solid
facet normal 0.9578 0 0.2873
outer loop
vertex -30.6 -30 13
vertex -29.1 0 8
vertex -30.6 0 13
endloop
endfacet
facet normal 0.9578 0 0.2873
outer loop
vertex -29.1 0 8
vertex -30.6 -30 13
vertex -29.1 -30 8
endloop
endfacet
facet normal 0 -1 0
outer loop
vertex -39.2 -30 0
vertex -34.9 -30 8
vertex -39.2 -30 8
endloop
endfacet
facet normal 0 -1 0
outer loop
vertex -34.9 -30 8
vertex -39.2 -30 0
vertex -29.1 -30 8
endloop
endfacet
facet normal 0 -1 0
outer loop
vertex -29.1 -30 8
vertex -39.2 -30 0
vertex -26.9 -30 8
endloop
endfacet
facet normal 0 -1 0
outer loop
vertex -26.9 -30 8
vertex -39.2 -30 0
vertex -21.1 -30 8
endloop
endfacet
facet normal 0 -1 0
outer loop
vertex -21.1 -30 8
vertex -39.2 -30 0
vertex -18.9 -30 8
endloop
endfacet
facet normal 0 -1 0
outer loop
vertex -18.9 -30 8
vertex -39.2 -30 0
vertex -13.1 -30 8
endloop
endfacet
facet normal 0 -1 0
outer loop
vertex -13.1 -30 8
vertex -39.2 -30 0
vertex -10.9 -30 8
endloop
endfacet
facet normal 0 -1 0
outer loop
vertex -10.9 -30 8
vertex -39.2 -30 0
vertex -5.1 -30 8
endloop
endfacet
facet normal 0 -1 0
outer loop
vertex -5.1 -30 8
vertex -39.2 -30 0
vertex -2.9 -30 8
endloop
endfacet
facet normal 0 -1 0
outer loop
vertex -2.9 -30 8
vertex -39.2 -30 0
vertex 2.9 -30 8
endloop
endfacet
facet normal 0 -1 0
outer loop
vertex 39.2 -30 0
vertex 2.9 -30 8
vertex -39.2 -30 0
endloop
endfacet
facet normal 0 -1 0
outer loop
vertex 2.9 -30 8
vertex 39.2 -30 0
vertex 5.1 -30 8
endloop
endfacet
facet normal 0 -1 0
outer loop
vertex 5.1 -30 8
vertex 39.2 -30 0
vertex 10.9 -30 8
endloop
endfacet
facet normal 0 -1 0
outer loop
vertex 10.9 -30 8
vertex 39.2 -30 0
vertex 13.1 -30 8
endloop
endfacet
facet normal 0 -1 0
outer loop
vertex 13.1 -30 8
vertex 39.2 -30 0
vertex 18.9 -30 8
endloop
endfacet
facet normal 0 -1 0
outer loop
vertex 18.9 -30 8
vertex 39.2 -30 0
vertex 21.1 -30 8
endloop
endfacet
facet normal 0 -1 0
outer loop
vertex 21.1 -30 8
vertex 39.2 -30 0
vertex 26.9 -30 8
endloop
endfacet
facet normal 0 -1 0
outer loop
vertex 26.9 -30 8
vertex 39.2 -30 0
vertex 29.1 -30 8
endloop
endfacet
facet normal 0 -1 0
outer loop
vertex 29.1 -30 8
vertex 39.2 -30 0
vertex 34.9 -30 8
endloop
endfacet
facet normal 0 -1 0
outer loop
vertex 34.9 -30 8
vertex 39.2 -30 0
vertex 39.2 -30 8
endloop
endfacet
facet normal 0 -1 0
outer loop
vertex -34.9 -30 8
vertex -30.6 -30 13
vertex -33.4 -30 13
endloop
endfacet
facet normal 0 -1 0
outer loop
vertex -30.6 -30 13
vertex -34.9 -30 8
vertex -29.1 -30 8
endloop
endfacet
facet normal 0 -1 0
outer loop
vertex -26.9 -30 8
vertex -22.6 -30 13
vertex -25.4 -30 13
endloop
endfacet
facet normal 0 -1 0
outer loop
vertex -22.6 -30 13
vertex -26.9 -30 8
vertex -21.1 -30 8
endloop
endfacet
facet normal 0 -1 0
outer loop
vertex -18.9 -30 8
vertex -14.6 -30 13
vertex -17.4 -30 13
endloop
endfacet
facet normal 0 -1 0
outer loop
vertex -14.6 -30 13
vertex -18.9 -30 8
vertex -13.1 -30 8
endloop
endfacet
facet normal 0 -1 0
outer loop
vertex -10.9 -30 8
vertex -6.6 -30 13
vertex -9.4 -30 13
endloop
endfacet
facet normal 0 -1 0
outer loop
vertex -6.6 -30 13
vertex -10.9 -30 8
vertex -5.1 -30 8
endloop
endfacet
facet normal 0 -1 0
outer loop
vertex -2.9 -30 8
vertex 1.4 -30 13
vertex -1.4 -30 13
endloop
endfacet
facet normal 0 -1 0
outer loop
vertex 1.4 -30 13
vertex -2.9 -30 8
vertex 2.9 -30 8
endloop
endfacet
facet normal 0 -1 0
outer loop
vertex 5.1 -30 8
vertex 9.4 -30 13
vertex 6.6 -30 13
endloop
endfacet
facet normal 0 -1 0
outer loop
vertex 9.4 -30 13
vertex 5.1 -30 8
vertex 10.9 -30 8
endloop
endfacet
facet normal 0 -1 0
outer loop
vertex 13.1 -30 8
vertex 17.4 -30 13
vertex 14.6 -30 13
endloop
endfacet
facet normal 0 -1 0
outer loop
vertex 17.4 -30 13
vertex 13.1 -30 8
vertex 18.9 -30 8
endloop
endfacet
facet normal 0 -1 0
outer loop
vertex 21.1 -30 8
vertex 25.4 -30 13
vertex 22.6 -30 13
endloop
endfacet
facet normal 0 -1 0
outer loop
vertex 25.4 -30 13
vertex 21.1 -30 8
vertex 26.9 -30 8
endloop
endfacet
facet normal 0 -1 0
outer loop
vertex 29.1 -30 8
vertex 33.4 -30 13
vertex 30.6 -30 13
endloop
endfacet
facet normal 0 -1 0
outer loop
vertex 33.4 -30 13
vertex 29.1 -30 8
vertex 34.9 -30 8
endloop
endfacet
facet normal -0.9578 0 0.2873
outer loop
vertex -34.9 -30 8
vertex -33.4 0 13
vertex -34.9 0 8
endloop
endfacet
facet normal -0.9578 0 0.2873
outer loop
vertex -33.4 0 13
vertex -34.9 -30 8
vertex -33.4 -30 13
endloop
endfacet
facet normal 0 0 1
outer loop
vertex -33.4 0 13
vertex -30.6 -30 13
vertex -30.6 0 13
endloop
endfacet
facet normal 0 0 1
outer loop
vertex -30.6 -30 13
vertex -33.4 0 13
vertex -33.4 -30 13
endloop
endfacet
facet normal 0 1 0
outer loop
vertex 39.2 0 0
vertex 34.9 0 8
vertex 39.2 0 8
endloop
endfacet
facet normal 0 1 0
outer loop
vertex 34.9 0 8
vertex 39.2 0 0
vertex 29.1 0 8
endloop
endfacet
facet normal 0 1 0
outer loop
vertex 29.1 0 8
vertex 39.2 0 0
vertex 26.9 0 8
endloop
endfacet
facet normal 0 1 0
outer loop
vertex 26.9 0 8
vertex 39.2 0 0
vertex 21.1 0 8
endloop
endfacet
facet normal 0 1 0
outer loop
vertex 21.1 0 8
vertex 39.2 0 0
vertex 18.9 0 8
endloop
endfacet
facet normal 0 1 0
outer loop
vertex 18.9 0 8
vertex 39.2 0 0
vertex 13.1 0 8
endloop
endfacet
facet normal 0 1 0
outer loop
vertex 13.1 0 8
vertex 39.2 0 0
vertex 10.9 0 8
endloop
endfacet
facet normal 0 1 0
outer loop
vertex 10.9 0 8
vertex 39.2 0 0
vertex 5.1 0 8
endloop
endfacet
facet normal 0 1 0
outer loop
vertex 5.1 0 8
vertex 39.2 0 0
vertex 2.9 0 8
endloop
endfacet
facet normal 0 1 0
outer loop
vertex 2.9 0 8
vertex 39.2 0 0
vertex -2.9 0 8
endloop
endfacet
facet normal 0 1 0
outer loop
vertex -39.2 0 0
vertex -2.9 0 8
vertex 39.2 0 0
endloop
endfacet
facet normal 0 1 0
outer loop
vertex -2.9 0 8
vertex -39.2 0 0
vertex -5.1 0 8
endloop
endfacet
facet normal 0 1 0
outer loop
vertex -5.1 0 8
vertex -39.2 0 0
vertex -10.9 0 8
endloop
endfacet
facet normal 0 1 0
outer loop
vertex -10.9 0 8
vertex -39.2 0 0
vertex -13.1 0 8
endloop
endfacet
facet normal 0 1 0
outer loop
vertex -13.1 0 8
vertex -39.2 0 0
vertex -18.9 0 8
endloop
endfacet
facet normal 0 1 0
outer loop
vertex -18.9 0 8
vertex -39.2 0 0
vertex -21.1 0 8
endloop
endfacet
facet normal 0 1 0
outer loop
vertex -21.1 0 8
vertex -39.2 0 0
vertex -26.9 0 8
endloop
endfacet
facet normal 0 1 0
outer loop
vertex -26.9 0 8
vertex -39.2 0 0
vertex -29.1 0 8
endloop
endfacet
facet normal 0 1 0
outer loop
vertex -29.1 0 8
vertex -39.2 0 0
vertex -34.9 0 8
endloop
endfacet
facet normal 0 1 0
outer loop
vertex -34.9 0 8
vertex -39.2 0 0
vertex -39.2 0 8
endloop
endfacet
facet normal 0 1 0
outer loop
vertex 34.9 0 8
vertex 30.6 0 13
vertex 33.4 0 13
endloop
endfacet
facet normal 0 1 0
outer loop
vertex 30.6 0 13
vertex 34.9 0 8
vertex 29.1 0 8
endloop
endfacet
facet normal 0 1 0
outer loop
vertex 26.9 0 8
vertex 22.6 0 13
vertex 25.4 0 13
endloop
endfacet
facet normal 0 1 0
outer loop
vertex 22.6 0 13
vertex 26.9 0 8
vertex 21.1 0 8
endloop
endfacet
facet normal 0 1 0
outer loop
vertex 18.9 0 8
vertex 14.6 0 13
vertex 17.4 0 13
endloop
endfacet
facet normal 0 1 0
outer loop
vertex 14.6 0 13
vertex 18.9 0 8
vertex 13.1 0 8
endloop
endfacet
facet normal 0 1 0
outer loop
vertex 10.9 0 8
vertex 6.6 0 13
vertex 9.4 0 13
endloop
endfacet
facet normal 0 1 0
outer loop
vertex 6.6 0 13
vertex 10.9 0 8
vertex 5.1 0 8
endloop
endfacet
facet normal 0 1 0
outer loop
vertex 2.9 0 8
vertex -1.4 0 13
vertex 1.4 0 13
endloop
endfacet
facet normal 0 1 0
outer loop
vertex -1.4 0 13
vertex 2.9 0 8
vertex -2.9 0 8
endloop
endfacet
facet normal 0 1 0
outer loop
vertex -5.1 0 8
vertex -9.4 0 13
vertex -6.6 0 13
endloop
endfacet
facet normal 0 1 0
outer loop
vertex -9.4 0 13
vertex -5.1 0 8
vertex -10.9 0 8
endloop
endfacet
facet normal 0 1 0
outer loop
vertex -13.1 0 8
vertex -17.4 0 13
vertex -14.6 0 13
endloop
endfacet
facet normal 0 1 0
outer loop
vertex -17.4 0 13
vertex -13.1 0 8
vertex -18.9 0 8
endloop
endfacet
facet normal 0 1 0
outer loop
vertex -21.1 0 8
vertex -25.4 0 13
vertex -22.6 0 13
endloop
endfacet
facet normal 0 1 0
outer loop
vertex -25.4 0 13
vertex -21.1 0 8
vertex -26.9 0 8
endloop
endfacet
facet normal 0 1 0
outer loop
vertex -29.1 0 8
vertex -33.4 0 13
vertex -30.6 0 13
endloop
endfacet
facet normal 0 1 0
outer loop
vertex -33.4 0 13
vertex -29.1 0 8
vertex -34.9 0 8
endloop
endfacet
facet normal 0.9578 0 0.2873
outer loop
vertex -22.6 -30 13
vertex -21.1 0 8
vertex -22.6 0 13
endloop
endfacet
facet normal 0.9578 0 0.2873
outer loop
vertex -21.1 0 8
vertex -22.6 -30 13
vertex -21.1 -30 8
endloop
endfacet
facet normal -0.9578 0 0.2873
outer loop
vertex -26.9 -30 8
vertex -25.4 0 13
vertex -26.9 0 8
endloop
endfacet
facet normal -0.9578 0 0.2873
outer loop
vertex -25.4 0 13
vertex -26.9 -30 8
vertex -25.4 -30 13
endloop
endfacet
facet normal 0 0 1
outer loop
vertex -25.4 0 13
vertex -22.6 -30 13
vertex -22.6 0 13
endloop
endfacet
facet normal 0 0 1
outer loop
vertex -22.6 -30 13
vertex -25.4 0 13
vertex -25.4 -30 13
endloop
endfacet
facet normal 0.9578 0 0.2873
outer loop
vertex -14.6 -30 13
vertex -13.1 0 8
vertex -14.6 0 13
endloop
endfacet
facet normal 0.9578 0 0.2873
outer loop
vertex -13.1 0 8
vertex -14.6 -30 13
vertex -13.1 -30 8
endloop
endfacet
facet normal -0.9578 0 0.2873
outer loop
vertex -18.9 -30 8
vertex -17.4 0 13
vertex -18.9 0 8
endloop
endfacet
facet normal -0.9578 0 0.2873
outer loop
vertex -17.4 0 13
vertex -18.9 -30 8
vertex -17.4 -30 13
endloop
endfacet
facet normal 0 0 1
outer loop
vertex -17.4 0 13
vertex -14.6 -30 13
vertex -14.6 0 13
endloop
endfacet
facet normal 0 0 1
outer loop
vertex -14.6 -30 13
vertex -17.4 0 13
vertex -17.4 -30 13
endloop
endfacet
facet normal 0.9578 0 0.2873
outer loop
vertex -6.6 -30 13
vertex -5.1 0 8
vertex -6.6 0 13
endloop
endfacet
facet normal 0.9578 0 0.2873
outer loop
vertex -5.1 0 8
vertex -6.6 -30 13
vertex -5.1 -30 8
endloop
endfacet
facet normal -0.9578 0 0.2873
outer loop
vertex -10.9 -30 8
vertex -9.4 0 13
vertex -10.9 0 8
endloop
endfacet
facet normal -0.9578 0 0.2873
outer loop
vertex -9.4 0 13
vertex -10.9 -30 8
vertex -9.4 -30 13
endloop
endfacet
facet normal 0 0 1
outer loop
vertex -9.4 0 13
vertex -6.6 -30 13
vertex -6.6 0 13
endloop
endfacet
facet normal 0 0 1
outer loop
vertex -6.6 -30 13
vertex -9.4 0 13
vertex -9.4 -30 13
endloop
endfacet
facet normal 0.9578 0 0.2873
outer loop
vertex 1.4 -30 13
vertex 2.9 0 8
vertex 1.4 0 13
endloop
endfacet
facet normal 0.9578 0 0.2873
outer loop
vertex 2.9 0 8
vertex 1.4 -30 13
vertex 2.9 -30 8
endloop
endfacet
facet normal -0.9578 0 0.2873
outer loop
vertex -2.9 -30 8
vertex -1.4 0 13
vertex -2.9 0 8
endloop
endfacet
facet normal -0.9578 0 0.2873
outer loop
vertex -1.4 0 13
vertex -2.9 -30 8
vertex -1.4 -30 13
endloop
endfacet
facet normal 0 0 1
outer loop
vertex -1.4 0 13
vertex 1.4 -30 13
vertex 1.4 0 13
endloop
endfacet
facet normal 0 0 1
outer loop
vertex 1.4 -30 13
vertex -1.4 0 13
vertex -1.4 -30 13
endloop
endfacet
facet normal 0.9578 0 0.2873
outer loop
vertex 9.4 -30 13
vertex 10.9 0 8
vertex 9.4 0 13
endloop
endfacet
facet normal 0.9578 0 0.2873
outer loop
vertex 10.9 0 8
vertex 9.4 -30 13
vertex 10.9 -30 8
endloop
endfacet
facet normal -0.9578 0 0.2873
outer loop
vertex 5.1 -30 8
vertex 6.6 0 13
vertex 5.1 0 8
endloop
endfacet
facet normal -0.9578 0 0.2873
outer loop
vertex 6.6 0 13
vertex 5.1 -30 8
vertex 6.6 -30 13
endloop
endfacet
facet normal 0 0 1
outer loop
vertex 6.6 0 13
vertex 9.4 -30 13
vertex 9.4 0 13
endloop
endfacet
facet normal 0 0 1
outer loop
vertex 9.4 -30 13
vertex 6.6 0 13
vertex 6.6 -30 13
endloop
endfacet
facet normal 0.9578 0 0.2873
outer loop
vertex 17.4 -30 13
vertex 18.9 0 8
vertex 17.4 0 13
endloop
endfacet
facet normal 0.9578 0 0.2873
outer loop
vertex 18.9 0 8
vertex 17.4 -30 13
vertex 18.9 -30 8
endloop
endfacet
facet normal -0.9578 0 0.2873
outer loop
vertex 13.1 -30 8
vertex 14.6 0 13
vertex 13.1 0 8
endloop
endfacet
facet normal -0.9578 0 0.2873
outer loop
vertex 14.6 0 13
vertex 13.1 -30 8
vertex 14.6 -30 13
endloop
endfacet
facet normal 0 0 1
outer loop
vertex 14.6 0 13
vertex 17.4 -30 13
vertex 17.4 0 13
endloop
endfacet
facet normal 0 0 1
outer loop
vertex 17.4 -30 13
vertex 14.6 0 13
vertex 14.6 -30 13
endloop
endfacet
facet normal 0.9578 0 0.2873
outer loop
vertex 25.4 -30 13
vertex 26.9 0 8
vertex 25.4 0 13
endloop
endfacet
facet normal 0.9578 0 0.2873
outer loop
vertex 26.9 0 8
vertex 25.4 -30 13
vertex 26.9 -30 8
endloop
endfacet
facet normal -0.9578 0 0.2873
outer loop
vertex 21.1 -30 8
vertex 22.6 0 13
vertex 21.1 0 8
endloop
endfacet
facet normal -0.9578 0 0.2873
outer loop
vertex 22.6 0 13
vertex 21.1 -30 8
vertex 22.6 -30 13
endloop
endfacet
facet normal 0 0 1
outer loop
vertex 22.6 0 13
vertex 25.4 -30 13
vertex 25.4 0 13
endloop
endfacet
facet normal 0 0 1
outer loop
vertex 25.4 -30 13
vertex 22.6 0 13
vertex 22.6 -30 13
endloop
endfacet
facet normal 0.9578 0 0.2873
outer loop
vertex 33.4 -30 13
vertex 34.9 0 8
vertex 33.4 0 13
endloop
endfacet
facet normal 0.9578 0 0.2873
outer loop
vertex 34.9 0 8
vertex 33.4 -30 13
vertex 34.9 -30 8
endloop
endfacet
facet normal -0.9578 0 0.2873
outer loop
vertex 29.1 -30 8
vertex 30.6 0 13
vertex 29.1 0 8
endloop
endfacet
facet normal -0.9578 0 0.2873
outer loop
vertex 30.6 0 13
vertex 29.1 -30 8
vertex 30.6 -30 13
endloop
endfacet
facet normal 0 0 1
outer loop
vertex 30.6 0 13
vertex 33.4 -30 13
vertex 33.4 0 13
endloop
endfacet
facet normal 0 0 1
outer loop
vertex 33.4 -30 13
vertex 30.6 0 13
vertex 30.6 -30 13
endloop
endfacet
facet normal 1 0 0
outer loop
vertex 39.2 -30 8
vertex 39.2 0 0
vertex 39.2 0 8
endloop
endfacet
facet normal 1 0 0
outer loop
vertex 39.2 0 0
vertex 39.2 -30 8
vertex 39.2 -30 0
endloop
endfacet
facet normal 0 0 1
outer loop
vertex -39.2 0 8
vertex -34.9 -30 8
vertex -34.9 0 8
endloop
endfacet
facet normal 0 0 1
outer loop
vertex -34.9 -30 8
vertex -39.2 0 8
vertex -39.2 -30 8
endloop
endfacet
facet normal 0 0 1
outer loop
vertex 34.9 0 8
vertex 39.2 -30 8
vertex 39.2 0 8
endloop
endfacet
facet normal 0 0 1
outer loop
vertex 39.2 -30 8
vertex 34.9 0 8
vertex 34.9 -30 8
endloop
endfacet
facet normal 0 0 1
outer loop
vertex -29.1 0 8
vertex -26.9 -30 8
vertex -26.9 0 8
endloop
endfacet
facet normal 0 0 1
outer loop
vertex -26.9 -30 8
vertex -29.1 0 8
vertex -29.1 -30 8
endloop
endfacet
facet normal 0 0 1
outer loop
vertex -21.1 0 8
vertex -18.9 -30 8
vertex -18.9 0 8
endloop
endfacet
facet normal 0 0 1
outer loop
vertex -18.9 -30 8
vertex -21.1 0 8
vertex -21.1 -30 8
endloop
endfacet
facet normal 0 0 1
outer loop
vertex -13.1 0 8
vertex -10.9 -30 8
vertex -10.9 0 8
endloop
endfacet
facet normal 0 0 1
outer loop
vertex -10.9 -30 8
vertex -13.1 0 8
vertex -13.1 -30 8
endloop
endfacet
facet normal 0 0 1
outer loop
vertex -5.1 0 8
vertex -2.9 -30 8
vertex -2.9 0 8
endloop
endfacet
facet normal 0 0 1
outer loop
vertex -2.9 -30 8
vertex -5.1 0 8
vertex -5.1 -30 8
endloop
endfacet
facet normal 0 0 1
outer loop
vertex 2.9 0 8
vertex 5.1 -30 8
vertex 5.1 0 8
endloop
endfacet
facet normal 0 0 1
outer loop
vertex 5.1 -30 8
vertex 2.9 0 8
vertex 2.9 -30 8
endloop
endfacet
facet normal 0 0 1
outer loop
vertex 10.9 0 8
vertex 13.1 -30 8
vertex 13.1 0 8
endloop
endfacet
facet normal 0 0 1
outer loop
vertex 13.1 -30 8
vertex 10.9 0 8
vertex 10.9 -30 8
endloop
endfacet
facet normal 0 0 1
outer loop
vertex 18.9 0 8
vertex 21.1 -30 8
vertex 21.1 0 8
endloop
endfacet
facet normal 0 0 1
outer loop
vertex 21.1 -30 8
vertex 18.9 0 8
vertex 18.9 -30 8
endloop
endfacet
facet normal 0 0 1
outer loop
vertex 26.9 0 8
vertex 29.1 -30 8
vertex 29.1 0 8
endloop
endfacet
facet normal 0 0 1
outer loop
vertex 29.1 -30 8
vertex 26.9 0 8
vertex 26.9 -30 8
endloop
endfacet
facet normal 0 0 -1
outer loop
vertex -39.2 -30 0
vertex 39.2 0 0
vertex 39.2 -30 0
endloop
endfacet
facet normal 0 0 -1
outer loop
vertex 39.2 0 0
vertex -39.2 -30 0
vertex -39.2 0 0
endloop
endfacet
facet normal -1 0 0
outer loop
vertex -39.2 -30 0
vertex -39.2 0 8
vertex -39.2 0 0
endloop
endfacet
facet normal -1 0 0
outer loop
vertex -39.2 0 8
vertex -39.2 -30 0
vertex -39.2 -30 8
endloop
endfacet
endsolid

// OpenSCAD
$fn = 32;

// ----------------------------------------------------------------------
// Toothed rack, 9 teeth
// 8 mm pitch, 5 mm teeth
// ----------------------------------------------------------------------

// --- parameters (mm) ---
bar_w = 30;     // bar width (Y)
bar_h = 8;      // bar height (Z)
teeth = 9;      // number of teeth
pitch = 8;      // tooth pitch
tooth_h = 5;    // tooth height above the bar
root_w = 6.4;   // tooth width at the root
crest_w = 2.8;  // tooth width at the crest

// --- derived feature positions (mm) ---
span = (teeth - 1) * pitch;  // = 64   distance between the outer teeth
bar_l = span + root_w + 8;   // = 78.4   bar length: teeth plus 4 mm at each end
tooth_x = -span / 2;         // = -32   X of the first tooth
height = bar_h + tooth_h;    // = 13   overall height
feature_centers = [
  [tooth_x + 0 * pitch, -bar_w / 2],
  [tooth_x + 1 * pitch, -bar_w / 2],
  [tooth_x + 2 * pitch, -bar_w / 2],
  [tooth_x + 3 * pitch, -bar_w / 2],
  [tooth_x + 4 * pitch, -bar_w / 2],
  [tooth_x + 5 * pitch, -bar_w / 2],
  [tooth_x + 6 * pitch, -bar_w / 2],
  [tooth_x + 7 * pitch, -bar_w / 2],
  [tooth_x + 8 * pitch, -bar_w / 2]
];   // tooth centre line, drives the tooth loop

// bar with a rack of teeth, one extruded trapezoium per centre
module rack_tooth() {
  linear_extrude(height = bar_w)
    polygon(points = [
      [0, 0],
      [root_w, 0],
      [root_w / 2 + crest_w / 2, tooth_h + 1],
      [root_w / 2 - crest_w / 2, tooth_h + 1]
    ]);
}

union() {
  translate([-bar_l / 2, -bar_w, 0]) cube([bar_l, bar_w, bar_h]);
  for (centre = feature_centers)
    translate([centre[0] - root_w / 2, 0, bar_h - 1]) rotate([90, 0, 0]) rack_tooth();
}
